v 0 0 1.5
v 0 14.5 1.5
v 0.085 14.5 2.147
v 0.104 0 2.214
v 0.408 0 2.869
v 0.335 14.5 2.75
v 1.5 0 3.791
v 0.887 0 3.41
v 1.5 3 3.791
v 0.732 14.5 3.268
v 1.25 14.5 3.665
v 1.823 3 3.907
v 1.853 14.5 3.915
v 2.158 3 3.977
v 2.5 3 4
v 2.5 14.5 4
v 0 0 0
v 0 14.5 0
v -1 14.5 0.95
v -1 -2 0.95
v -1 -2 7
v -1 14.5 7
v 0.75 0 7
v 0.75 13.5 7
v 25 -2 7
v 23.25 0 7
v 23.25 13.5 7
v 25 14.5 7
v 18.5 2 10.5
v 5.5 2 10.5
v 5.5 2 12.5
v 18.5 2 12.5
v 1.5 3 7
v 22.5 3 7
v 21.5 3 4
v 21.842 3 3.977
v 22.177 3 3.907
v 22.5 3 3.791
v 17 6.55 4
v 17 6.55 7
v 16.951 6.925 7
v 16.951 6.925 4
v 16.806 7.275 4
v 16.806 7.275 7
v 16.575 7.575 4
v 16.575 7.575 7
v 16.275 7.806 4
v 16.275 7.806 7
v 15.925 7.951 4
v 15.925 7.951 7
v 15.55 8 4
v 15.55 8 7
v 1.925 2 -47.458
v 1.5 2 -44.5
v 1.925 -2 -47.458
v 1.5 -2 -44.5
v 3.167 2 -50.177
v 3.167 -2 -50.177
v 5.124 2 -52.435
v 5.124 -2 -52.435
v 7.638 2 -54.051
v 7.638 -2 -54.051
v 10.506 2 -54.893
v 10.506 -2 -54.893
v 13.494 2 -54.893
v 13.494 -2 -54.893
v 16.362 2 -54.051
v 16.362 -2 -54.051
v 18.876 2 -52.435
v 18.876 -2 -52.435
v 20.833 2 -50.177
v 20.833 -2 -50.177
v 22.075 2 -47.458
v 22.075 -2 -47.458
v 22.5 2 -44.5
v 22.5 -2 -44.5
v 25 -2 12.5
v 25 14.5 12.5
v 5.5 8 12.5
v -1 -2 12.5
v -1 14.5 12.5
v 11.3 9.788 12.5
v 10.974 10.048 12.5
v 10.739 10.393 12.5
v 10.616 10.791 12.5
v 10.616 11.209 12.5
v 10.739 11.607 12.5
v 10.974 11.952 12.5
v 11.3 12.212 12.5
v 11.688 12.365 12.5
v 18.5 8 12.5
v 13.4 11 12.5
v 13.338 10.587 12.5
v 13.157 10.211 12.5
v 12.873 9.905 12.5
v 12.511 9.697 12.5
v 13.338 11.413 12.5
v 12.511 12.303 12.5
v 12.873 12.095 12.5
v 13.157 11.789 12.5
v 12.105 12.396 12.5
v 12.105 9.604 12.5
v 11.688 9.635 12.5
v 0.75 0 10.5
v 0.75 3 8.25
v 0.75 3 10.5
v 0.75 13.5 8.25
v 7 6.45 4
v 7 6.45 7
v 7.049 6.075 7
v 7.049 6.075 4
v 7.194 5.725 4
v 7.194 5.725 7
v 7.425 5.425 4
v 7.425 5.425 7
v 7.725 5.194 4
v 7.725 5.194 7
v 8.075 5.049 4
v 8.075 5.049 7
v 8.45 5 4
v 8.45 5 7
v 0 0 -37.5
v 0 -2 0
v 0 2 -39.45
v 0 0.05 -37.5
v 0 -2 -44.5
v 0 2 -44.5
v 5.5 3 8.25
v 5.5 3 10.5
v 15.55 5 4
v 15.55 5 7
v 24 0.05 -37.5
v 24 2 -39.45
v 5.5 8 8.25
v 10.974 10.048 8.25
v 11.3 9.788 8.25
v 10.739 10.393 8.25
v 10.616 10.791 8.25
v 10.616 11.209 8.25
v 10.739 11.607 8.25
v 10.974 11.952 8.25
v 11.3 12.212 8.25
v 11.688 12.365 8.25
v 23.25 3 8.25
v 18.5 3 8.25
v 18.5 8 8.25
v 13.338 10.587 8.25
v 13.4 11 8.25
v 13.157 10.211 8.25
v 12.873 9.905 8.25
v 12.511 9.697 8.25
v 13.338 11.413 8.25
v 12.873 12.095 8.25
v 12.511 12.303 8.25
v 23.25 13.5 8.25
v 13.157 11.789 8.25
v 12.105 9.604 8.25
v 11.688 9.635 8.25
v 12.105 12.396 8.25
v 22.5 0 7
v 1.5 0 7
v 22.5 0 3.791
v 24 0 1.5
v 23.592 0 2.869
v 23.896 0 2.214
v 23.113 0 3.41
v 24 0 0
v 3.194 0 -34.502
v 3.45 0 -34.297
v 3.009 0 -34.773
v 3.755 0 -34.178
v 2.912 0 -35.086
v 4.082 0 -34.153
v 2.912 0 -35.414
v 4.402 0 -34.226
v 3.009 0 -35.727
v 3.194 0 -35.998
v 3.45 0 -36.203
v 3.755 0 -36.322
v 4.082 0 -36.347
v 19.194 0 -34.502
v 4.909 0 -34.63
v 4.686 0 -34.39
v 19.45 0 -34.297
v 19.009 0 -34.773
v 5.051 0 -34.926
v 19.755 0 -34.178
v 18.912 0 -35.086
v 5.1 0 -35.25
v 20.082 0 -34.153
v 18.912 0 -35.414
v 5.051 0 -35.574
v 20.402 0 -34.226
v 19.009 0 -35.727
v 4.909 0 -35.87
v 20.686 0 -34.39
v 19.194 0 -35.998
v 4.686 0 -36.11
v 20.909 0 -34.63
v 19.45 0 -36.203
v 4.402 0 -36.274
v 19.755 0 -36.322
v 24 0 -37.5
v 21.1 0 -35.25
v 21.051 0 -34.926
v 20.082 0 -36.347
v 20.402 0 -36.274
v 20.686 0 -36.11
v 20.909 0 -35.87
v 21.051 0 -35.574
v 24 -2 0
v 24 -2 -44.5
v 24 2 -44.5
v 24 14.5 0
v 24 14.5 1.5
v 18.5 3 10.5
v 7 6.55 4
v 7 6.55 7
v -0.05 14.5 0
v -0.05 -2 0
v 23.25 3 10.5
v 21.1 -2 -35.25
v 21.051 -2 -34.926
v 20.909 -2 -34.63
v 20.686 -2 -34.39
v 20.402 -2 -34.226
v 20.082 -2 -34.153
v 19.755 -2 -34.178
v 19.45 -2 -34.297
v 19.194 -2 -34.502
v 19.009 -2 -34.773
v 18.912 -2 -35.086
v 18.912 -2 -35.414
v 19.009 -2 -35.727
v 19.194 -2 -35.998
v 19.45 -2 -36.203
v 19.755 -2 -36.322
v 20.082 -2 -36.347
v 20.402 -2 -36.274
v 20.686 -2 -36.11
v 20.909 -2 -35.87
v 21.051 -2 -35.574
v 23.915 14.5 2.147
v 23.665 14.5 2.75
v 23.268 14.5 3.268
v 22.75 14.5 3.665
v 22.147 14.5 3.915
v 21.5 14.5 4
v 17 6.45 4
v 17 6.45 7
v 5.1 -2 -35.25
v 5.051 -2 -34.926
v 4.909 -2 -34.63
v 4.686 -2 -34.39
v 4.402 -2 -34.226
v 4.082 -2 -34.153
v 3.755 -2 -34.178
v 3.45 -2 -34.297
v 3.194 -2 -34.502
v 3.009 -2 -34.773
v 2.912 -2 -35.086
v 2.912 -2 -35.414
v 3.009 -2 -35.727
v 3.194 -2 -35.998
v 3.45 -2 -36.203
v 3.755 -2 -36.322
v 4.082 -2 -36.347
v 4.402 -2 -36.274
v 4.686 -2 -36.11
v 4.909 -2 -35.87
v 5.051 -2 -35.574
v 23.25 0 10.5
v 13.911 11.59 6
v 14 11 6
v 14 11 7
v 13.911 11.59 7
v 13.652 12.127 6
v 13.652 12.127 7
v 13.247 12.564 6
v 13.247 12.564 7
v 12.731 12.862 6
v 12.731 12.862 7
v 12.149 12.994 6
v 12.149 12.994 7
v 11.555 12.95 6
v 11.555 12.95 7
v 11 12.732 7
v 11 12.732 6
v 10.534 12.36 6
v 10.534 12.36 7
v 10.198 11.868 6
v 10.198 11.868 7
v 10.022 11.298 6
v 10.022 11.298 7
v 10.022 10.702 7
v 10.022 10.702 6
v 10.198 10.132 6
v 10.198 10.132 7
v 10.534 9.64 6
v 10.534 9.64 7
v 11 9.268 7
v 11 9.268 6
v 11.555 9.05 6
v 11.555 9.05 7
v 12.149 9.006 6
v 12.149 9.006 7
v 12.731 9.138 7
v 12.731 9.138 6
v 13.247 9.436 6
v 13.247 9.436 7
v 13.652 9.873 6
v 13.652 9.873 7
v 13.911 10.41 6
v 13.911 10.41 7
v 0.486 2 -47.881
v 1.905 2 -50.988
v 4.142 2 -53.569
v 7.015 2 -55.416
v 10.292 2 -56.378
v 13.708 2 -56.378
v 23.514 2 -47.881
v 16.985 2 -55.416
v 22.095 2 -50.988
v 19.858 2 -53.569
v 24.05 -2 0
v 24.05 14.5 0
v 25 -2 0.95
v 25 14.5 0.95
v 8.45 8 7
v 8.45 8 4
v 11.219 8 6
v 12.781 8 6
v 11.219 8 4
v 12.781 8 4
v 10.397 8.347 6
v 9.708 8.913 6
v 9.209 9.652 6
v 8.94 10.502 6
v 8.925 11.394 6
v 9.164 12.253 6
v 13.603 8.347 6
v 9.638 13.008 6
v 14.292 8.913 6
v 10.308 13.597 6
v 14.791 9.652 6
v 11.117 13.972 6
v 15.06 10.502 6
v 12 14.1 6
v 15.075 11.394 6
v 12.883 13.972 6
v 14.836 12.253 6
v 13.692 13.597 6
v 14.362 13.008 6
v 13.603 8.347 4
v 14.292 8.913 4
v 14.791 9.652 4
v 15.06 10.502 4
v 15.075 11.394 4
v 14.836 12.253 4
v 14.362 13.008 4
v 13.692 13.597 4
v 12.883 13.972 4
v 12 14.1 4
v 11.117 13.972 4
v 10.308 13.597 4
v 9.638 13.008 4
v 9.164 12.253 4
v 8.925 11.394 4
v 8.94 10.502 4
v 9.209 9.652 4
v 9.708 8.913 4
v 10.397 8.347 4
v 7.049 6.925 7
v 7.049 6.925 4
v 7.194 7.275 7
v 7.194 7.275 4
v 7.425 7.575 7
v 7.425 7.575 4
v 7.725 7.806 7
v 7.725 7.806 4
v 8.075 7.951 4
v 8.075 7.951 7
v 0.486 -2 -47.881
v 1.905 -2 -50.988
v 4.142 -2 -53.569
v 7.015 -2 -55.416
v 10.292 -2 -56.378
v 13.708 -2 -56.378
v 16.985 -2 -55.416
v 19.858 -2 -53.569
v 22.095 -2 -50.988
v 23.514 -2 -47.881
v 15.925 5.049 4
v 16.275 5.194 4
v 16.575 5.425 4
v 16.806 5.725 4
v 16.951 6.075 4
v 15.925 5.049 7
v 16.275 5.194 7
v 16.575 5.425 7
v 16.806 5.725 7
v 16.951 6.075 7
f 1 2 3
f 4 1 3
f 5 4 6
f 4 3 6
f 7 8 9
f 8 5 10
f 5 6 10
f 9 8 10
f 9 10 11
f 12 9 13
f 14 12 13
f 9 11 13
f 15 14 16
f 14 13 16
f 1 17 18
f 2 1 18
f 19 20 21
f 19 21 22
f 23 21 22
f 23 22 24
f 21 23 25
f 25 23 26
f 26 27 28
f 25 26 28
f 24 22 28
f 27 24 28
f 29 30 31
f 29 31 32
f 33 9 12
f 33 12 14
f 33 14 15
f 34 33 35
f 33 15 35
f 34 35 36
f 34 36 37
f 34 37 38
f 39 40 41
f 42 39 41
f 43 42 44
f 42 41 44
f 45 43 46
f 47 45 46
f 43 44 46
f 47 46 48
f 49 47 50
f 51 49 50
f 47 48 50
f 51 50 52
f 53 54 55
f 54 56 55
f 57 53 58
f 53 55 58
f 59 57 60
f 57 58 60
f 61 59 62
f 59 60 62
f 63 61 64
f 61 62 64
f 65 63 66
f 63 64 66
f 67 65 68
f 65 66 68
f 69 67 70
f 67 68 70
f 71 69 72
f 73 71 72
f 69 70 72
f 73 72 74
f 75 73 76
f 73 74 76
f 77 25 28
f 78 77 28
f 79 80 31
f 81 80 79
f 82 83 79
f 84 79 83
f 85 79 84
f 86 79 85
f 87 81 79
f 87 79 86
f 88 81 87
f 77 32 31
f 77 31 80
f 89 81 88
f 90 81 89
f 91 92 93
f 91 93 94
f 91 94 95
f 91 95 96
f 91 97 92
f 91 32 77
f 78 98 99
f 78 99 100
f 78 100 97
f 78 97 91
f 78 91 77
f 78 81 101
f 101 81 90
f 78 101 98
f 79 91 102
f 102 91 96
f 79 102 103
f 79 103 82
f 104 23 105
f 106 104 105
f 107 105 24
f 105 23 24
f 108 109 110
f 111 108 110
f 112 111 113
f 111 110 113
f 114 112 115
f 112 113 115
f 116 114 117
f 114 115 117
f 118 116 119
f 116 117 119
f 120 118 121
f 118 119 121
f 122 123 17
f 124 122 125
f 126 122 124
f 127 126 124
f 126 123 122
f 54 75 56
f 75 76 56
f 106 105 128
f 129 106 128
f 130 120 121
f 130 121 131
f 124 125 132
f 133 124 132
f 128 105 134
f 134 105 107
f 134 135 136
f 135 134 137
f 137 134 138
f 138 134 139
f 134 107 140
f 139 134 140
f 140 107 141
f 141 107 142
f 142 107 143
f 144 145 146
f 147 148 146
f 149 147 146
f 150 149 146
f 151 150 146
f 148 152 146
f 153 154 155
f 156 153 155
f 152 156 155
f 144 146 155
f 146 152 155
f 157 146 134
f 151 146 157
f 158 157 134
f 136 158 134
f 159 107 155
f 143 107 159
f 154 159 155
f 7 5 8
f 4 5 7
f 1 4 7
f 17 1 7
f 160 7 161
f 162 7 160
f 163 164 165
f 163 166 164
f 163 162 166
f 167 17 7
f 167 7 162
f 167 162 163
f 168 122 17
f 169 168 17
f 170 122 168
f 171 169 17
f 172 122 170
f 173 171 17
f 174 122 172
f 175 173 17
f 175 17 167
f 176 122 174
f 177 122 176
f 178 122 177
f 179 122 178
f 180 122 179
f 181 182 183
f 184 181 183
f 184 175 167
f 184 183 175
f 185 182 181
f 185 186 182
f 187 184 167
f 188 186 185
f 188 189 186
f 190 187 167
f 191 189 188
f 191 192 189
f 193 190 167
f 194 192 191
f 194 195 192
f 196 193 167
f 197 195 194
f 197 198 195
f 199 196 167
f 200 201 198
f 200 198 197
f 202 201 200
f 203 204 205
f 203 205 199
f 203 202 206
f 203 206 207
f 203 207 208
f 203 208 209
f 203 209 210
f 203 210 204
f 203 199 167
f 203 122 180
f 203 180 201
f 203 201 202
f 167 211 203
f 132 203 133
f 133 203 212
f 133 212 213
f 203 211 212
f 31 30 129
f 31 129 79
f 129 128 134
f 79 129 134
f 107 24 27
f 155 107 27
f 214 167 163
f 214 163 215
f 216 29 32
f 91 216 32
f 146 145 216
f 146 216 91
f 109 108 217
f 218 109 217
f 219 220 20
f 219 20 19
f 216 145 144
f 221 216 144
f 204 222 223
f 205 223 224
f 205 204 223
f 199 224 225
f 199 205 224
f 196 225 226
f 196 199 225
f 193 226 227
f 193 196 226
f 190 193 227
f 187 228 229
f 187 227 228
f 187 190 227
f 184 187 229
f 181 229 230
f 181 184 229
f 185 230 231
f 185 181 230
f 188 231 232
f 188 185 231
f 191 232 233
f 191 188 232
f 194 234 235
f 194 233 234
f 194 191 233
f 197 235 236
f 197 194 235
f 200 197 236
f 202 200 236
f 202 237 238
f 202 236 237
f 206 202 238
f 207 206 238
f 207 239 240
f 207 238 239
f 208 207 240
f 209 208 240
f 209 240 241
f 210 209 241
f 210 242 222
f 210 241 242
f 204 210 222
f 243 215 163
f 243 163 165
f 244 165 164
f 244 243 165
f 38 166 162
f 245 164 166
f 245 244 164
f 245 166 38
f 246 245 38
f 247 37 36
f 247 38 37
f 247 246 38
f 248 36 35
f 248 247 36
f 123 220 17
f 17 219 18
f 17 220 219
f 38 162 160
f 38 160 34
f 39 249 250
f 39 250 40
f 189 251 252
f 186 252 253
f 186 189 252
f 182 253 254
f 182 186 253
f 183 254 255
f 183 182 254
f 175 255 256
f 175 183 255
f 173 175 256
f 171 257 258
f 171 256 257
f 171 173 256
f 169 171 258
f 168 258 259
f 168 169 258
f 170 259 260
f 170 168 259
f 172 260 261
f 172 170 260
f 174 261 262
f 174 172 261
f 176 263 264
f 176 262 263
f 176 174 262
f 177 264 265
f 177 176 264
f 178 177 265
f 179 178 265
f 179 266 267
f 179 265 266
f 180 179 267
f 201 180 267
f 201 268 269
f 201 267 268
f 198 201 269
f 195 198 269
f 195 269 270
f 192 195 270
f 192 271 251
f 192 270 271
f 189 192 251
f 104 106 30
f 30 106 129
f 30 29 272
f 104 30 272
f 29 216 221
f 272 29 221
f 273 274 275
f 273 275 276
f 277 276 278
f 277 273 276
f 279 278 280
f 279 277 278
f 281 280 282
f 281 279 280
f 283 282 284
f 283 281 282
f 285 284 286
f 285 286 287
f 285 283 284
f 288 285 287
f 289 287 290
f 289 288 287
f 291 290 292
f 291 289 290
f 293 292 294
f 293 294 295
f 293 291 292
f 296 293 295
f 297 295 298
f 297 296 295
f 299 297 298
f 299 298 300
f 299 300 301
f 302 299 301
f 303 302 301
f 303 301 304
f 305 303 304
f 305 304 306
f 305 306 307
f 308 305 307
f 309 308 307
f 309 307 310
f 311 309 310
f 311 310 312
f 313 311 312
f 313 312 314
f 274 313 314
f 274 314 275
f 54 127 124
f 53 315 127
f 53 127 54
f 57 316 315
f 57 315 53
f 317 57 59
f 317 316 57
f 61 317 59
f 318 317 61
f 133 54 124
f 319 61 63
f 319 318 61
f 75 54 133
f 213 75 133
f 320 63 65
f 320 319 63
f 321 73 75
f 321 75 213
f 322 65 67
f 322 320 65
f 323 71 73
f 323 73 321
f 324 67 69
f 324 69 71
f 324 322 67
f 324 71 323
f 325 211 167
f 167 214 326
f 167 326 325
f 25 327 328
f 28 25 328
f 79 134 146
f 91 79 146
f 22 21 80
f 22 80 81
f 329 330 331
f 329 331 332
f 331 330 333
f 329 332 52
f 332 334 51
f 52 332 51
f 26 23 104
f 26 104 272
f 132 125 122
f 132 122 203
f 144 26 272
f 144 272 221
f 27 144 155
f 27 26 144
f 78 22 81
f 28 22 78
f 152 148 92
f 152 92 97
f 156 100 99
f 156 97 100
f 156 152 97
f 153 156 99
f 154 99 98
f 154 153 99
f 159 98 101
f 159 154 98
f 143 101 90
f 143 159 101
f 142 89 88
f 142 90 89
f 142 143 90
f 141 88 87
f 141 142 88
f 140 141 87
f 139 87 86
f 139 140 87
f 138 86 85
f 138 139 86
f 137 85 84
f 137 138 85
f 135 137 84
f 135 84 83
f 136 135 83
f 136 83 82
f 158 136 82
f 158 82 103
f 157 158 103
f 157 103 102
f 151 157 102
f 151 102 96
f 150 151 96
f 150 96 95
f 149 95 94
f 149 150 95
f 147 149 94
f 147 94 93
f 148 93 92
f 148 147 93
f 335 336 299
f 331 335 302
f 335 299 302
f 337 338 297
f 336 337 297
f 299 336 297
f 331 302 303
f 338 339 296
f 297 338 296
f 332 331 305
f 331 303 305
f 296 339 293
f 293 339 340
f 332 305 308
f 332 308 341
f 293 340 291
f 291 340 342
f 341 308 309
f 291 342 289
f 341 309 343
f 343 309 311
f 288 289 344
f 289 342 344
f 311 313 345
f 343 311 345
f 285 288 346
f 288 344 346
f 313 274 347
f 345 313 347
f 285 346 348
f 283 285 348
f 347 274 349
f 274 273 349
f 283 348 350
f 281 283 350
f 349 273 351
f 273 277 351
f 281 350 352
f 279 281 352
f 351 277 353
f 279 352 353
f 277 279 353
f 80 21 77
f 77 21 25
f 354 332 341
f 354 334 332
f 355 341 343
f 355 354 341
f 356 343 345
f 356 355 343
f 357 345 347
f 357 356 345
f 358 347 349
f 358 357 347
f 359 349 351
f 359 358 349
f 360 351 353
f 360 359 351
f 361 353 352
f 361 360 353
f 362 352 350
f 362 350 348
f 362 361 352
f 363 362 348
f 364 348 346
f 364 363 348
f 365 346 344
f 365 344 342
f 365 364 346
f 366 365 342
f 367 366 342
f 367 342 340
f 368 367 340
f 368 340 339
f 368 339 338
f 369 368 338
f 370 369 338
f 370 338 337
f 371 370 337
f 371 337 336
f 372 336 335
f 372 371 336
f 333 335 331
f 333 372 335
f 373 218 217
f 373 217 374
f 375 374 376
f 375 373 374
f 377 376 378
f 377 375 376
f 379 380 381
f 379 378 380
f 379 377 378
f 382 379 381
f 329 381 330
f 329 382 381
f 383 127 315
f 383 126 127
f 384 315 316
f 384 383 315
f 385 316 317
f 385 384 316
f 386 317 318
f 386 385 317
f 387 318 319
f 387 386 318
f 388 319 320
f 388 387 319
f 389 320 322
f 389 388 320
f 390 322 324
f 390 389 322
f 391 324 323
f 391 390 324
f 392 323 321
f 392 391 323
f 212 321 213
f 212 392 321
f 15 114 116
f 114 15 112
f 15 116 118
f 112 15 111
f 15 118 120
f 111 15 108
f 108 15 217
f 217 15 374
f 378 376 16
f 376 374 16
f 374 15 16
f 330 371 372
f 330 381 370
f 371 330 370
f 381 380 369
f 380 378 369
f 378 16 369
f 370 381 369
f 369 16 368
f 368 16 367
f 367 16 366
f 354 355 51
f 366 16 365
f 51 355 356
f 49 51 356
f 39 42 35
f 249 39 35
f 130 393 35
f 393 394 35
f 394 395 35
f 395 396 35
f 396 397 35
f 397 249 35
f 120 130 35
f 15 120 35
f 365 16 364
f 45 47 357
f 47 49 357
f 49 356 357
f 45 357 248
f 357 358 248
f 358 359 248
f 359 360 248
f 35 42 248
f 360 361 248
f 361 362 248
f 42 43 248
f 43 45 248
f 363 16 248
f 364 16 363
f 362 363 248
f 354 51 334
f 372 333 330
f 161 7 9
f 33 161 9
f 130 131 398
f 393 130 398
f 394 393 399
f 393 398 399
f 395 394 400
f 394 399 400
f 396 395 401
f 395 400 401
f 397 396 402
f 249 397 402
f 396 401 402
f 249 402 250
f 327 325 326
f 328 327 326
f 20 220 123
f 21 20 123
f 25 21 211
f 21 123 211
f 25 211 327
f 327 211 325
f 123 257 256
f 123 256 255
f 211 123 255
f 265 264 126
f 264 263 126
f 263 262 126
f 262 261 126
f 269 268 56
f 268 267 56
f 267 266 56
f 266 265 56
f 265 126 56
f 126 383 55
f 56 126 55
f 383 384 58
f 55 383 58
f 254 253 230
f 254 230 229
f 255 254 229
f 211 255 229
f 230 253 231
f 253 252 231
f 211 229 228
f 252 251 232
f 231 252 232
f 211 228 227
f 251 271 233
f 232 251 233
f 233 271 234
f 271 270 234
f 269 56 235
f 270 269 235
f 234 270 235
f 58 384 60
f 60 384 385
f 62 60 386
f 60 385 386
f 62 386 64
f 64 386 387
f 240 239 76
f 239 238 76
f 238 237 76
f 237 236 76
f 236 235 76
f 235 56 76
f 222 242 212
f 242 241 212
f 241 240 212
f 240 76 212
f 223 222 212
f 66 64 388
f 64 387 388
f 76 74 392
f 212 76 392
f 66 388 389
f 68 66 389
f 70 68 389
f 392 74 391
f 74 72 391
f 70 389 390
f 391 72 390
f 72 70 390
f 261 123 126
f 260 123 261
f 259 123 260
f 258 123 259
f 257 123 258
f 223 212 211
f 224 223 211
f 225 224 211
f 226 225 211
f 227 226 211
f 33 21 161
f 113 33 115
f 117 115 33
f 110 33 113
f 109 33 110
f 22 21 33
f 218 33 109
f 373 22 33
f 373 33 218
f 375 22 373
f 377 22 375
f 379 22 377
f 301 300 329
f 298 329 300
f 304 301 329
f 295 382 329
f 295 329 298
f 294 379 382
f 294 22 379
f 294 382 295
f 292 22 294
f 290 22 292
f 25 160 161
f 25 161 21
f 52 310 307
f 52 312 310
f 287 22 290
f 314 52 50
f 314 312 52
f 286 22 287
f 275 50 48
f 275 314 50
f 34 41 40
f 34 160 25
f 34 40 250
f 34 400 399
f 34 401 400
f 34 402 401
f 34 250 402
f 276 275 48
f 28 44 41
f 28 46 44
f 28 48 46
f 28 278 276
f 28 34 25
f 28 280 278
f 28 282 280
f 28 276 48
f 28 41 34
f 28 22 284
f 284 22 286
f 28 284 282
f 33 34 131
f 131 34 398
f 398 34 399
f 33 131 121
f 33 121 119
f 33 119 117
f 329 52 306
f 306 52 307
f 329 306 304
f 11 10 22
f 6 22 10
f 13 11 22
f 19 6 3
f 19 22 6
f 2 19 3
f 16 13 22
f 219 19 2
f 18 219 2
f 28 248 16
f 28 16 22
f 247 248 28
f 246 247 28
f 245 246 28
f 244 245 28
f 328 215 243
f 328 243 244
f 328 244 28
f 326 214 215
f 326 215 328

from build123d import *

# Parameters (mm, degrees)
CYLINDER005_R     = 3.1
CYLINDER005_DEPTH = 2
BOX002_W          = 21
BOX002_H          = 3
BOX002_DEPTH      = 7
BOX003_W          = 10
BOX003_H          = 3
BOX003_DEPTH      = 7
FILLET001_R       = 1.45
CYLINDER006_R     = 2
CYLINDER006_DEPTH = 2
BOX_W             = 24
BOX_H             = 14.5
BOX_DEPTH         = 4
FILLET_R          = 2.5
BOX001_W          = 26
BOX001_H          = 16.5
BOX001_DEPTH      = 7
CHAMFER_SIZE      = 0.95
CYLINDER009_W     = 10.5
CYLINDER009_H     = 4
CYLINDER009_ANGLE = 180
CYLINDER008_W     = 12
CYLINDER008_H     = 4
CYLINDER008_ANGLE = 180
BOX011_W          = 24
BOX011_H          = 4
BOX011_DEPTH      = 7
CYLINDER001_R     = 1.1
CYLINDER001_DEPTH = 10
CYLINDER002_R     = 1.1
CYLINDER002_DEPTH = 10
BOX007_W          = 24
BOX007_H          = 2
BOX007_DEPTH      = 43.5
CHAMFER001_SIZE   = 1.95
BOX012_W          = 22.5
BOX012_H          = 10.5
BOX012_DEPTH      = 1.25
CYLINDER007_R     = 1.4
CYLINDER007_DEPTH = 6
BOX004_W          = 22.5
BOX004_H          = 3
BOX004_DEPTH      = 3.5
BOX010_W          = 13
BOX010_H          = 6
BOX010_DEPTH      = 10
BOX005_W          = 26
BOX005_H          = 16.5
BOX005_DEPTH      = 5.5


with BuildPart() as cylinder005_bolt_head:
    # Cylinder005 → Cylinder005 (new body)
    with BuildSketch(Plane(origin=(12, 11, 4), x_dir=(1, 0, 0), z_dir=(0, 0, 1))):
        Circle(CYLINDER005_R)
    extrude(amount=CYLINDER005_DEPTH)


with BuildPart() as cube_header_cutter:
    # Box002 → Box002 (new body)
    with BuildSketch(Plane(origin=(1.5, 0, 0), x_dir=(1, 0, 0), z_dir=(0, 0, 1))):
        with Locations((10.5, 1.5)):
            Rectangle(BOX002_W, BOX002_H)
    extrude(amount=BOX002_DEPTH)


with BuildPart() as fillet001:
    # Box003 → Box003 (new body)
    with BuildSketch(Plane(origin=(7, 5, 0), x_dir=(1, 0, 0), z_dir=(0, 0, 1))):
        with Locations((5, 1.5)):
            Rectangle(BOX003_W, BOX003_H)
    extrude(amount=BOX003_DEPTH)

    # Fillet001
    fillet001_edges = [fillet001.edges().sort_by_distance(p)[0] for p in [
        (7, 5, 3.5),
        (7, 8, 3.5),
        (17, 5, 3.5),
        (17, 8, 3.5),
    ]]
    fillet(fillet001_edges, radius=FILLET001_R)


with BuildPart() as fusion:
    # Cylinder006 → Cylinder006 (new body)
    with BuildSketch(Plane(origin=(12, 11, 5), x_dir=(1, 0, 0), z_dir=(0, 0, 1))):
        Circle(CYLINDER006_R)
    extrude(amount=CYLINDER006_DEPTH)

    # Fusion: union Cylinder005(bolt_head), Cube(header_cutter), Fillet001
    add(cylinder005_bolt_head.part)
    add(cube_header_cutter.part)
    add(fillet001.part)


with BuildPart() as fillet_body:
    # Box → Box (new body)
    with BuildSketch(Plane.XY):
        with Locations((12, 7.25)):
            Rectangle(BOX_W, BOX_H)
    extrude(amount=BOX_DEPTH)

    # Fillet
    fillet_edges = [fillet_body.edges().sort_by_distance(p)[0] for p in [
        (0, 7.25, 4),
        (24, 7.25, 4),
    ]]
    fillet(fillet_edges, radius=FILLET_R)


with BuildPart() as chamfer_body:
    # Box001 → Box001 (new body)
    with BuildSketch(Plane(origin=(-1, -2, 0), x_dir=(1, 0, 0), z_dir=(0, 0, 1))):
        with Locations((13, 8.25)):
            Rectangle(BOX001_W, BOX001_H)
    extrude(amount=BOX001_DEPTH)

    # Cut: cut Fillet body
    add(fillet_body.part, mode=Mode.SUBTRACT)

    # Cut001: cut Fusion
    add(fusion.part, mode=Mode.SUBTRACT)

    # Chamfer
    chamfer_edges = [chamfer_body.edges().sort_by_distance(p)[0] for p in [
        (-1, 6.25, 0),
        (25, 6.25, 0),
    ]]
    chamfer(chamfer_edges, length=CHAMFER_SIZE)


with BuildPart() as cylinder008_inner_hook:
    # Cylinder009 → Cylinder009 (revolve)
    with BuildSketch(Plane(origin=(12, 2, -44.5), x_dir=(-1, 0, 0), z_dir=(0, 0, 1))):
        with Locations((5.25, 2)):
            Rectangle(CYLINDER009_W, CYLINDER009_H)
    revolve(axis=Axis((12, 2, -44.5), (0, -1, 0)), revolution_arc=CYLINDER009_ANGLE)


with BuildPart() as cylinder008_outer_hook:
    # Cylinder008 → Cylinder008 (revolve)
    with BuildSketch(Plane(origin=(12, 2, -44.5), x_dir=(-1, 0, 0), z_dir=(0, 0, 1))):
        with Locations((6, 2)):
            Rectangle(CYLINDER008_W, CYLINDER008_H)
    revolve(axis=Axis((12, 2, -44.5), (0, -1, 0)), revolution_arc=CYLINDER008_ANGLE)


with BuildPart() as cut004:
    # Box011 → Box011 (new body)
    with BuildSketch(Plane(origin=(0, -2, -44.5), x_dir=(1, 0, 0), z_dir=(0, 0, 1))):
        with Locations((12, 2)):
            Rectangle(BOX011_W, BOX011_H)
    extrude(amount=BOX011_DEPTH)

    # Fusion008: union Cylinder008(outer_hook)
    add(cylinder008_outer_hook.part)

    # Cut004: cut Cylinder008(inner_hook)
    add(cylinder008_inner_hook.part, mode=Mode.SUBTRACT)


with BuildPart() as cylinder001_right_bolt_clear:
    # Cylinder001 → Cylinder001 (new body)
    with BuildSketch(Plane(origin=(4, 0, -35.25), x_dir=(1, 0, 0), z_dir=(0, -1, 0))):
        Circle(CYLINDER001_R)
    extrude(amount=CYLINDER001_DEPTH)


with BuildPart() as fusion004:
    # Cylinder002 → Cylinder002 (new body)
    with BuildSketch(Plane(origin=(20, 0, -35.25), x_dir=(1, 0, 0), z_dir=(0, -1, 0))):
        Circle(CYLINDER002_R)
    extrude(amount=CYLINDER002_DEPTH)

    # Fusion004: union Cylinder001(right_bolt_clear)
    add(cylinder001_right_bolt_clear.part)


with BuildPart() as chamfer001_base:
    # Box007 → Box007 (new body)
    with BuildSketch(Plane(origin=(0, -2, -37.5), x_dir=(1, 0, 0), z_dir=(0, 0, 1))):
        with Locations((12, 1)):
            Rectangle(BOX007_W, BOX007_H)
    extrude(amount=BOX007_DEPTH)

    # Cut005: cut Fusion004
    add(fusion004.part, mode=Mode.SUBTRACT)

    # Fusion009: union Chamfer body, Cut004
    add(chamfer_body.part)
    add(cut004.part)

    # Chamfer001
    chamfer001_edges = [chamfer001_base.edges().sort_by_distance(p)[0] for p in [
        (12, 2, -37.5),
    ]]
    chamfer(chamfer001_edges, length=CHAMFER001_SIZE)


with BuildPart() as box012:
    # Box012 → Box012 (new body)
    with BuildSketch(Plane(origin=(0.75, 3, 7), x_dir=(1, 0, 0), z_dir=(0, 0, 1))):
        with Locations((11.25, 5.25)):
            Rectangle(BOX012_W, BOX012_H)
    extrude(amount=BOX012_DEPTH)


with BuildPart() as cylinder005_bolt_thread:
    # Cylinder007 → Cylinder007 (new body)
    with BuildSketch(Plane(origin=(12, 11, 7), x_dir=(1, 0, 0), z_dir=(0, 0, 1))):
        Circle(CYLINDER007_R)
    extrude(amount=CYLINDER007_DEPTH)


with BuildPart() as cube_pcb_cut:
    # Box004 → Box004 (new body)
    with BuildSketch(Plane(origin=(0.75, 0, 7), x_dir=(1, 0, 0), z_dir=(0, 0, 1))):
        with Locations((11.25, 1.5)):
            Rectangle(BOX004_W, BOX004_H)
    extrude(amount=BOX004_DEPTH)


with BuildPart() as fusion007:
    # Box010 → Box010 (new body)
    with BuildSketch(Plane(origin=(5.5, 2, 7), x_dir=(1, 0, 0), z_dir=(0, 0, 1))):
        with Locations((6.5, 3)):
            Rectangle(BOX010_W, BOX010_H)
    extrude(amount=BOX010_DEPTH)

    # Fusion007: union Cylinder005(bolt_thread), Cube(pcb_cut)
    add(cylinder005_bolt_thread.part)
    add(cube_pcb_cut.part)


with BuildPart() as cut006_cover:
    # Box005 → Box005 (new body)
    with BuildSketch(Plane(origin=(-1, -2, 7), x_dir=(1, 0, 0), z_dir=(0, 0, 1))):
        with Locations((13, 8.25)):
            Rectangle(BOX005_W, BOX005_H)
    extrude(amount=BOX005_DEPTH)

    # Cut003: cut Fusion007
    add(fusion007.part, mode=Mode.SUBTRACT)

    # Cut006: cut Box012
    add(box012.part, mode=Mode.SUBTRACT)


solid = Compound([chamfer001_base.part, cut006_cover.part])
